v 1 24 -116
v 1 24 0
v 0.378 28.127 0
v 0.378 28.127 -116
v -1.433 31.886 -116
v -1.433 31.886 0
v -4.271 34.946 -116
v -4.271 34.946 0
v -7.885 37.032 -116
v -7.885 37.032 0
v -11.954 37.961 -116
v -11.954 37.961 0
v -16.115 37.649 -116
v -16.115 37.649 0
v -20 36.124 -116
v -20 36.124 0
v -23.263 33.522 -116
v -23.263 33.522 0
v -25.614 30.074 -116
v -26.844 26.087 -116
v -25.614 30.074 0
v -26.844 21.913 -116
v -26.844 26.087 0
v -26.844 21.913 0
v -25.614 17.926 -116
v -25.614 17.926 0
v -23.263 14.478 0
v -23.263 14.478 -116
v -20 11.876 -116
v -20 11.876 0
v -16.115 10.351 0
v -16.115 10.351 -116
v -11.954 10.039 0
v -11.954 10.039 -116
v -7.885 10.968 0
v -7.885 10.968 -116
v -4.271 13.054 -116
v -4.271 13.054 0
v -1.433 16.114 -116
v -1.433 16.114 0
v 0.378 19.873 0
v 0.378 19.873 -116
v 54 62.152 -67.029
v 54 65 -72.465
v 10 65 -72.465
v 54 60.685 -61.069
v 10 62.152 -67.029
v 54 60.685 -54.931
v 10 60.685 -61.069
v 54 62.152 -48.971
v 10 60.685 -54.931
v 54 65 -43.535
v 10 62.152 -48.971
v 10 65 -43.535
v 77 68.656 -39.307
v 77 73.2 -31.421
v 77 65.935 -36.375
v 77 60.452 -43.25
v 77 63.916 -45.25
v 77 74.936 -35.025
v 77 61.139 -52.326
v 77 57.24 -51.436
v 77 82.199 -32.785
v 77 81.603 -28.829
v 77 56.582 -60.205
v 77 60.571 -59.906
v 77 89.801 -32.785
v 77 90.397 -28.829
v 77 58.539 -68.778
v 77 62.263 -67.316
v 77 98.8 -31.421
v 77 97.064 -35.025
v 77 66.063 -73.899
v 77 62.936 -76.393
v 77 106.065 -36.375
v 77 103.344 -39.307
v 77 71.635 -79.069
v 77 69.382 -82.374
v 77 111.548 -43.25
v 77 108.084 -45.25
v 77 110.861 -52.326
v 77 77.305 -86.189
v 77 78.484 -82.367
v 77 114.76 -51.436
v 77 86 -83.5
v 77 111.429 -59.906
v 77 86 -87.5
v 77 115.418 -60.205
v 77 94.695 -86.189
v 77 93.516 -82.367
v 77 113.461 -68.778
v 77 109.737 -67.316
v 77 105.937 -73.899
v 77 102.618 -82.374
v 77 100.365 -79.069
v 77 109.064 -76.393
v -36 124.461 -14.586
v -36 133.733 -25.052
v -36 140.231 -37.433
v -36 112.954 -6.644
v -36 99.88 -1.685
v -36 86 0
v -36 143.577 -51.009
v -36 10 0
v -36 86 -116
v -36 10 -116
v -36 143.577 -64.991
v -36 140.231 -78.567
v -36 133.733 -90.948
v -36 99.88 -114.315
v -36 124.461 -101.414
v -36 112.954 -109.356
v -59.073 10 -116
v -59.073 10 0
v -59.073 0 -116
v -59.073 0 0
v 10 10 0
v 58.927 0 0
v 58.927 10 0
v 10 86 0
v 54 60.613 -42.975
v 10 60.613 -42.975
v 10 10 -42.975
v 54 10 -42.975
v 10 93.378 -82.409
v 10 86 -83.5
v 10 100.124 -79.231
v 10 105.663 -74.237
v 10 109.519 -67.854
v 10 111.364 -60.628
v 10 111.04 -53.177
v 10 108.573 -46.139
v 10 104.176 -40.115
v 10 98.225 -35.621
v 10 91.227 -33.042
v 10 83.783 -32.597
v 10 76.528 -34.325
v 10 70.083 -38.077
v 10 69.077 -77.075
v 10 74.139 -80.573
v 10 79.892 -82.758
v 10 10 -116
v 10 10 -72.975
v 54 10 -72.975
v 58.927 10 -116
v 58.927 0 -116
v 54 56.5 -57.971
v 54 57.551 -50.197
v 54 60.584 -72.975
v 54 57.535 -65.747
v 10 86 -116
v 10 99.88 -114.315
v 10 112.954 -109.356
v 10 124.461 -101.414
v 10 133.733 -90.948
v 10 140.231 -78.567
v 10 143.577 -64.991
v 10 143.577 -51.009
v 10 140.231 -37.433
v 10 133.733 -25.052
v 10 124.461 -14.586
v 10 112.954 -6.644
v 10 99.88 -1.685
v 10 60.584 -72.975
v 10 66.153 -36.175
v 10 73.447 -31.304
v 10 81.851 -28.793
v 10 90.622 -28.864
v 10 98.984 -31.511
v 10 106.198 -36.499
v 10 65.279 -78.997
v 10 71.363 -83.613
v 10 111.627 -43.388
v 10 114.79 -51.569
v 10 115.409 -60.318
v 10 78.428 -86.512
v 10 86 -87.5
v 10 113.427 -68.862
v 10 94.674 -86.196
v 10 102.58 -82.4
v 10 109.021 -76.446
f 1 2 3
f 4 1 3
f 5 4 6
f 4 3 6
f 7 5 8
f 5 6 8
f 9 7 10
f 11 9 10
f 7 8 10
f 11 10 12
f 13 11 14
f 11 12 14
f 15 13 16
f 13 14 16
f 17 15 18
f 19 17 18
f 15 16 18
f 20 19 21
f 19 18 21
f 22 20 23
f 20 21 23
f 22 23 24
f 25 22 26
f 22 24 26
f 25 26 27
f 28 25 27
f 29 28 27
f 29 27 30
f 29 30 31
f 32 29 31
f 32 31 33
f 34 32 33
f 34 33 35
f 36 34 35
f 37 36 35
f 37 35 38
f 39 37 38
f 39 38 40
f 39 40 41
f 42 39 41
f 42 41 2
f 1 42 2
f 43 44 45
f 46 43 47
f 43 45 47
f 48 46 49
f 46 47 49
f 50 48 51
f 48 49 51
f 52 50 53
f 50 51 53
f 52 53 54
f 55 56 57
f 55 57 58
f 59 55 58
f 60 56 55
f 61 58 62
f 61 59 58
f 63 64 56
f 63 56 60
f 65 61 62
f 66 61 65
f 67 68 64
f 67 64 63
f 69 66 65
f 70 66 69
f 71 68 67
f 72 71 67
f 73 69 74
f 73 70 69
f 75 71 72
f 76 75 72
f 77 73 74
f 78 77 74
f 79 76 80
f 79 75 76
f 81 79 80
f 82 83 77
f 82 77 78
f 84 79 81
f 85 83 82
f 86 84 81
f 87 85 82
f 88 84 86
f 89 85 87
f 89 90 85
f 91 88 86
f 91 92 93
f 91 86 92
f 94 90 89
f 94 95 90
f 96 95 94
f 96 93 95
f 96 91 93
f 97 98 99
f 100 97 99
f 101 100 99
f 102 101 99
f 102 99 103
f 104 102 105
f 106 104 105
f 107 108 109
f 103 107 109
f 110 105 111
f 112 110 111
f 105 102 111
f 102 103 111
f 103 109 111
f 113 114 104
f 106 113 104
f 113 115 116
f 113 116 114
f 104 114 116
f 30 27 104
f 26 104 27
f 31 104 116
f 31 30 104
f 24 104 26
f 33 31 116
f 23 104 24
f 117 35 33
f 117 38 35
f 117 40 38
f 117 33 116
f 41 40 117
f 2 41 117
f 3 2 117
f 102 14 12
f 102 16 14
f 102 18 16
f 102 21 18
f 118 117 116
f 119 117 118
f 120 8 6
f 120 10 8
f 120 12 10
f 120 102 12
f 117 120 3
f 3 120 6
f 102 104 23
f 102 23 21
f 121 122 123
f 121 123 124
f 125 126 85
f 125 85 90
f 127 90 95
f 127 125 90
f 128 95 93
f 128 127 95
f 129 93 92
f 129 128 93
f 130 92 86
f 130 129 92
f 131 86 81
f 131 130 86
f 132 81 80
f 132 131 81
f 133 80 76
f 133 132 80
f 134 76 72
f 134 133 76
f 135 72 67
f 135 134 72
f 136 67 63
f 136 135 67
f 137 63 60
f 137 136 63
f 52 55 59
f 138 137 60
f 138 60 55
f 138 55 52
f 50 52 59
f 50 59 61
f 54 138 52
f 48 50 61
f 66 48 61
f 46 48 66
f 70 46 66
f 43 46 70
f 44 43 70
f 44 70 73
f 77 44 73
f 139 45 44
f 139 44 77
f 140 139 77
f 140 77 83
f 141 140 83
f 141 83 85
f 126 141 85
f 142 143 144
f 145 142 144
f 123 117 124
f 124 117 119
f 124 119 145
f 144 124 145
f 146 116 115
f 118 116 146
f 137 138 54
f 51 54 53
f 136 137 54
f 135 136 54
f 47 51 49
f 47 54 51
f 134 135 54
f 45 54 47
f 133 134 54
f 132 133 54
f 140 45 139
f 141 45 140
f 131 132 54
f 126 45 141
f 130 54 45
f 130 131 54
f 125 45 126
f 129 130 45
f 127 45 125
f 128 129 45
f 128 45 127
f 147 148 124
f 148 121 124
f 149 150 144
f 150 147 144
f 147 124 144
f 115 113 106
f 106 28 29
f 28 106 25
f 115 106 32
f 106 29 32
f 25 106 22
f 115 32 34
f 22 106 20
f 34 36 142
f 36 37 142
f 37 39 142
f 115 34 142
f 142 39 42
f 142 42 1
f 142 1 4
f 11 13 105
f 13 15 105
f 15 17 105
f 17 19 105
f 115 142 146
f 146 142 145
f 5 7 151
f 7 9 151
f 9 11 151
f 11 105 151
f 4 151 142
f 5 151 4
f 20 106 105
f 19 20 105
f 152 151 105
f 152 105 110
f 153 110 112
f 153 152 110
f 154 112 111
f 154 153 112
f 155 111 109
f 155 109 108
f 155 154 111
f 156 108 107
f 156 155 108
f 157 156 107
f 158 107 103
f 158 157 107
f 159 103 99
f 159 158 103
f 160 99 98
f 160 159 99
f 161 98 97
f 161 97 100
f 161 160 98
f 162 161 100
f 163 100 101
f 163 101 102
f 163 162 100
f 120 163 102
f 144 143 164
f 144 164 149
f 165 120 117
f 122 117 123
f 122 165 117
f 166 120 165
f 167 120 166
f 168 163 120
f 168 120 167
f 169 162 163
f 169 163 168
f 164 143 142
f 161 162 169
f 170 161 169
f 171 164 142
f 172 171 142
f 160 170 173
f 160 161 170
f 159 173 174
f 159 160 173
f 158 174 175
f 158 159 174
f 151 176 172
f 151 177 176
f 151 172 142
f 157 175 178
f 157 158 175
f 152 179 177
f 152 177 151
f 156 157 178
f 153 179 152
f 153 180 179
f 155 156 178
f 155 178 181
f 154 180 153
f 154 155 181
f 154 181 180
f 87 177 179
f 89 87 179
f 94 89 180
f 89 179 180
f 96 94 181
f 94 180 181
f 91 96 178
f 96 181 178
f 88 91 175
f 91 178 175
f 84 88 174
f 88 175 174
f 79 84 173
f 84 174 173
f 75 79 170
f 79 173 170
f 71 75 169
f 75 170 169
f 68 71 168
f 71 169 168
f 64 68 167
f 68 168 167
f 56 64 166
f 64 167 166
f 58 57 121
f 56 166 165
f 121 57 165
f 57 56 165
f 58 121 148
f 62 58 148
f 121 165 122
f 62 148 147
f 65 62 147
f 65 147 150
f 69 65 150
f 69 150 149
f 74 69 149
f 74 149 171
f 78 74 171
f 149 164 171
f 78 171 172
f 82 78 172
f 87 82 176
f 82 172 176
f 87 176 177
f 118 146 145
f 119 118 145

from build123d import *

# Parameters (mm, degrees)
SKETCH1_W           = 118
SKETCH1_H           = 10
BOSS_EXTRUDE1_DEPTH = 116
BOSS_EXTRUDE2_DEPTH = 46
SKETCH3_R           = 14
CUT_EXTRUDE1_DEPTH  = 195.117634996
SKETCH4_R           = 29.5
SKETCH4_R_2         = 25.5
BOSS_EXTRUDE3_DEPTH = 67
SKETCH6_W           = 44
SKETCH6_H           = 30
BOSS_EXTRUDE4_DEPTH = 55
CUT_EXTRUDE2_START  = -44
CUT_EXTRUDE2_DEPTH  = 44


with BuildPart() as part:
    # Sketch1 → Boss-Extrude1 (new body)
    with BuildSketch(Plane.XY):
        with Locations((-0.073312219, 5)):
            Rectangle(SKETCH1_W, SKETCH1_H)
    extrude(amount=-BOSS_EXTRUDE1_DEPTH)

    # Sketch2 → Boss-Extrude2 (add)
    with BuildSketch(Plane(origin=(10, 0, 0), x_dir=(0, 0, -1), z_dir=(1, 0, 0))):
        with BuildLine():
            Line((0, 86), (0, 10))
            Line((0, 10), (116, 10))
            Line((116, 10), (116, 86))
            ThreePointArc((116, 86), (58, 144), (0, 86))
        make_face()
    extrude(amount=-BOSS_EXTRUDE2_DEPTH)

    # Sketch3 → Cut-Extrude1 (cut, through all)
    with BuildSketch(Plane.XY):
        with Locations((-13, 24)):
            Circle(SKETCH3_R)
    extrude(amount=-CUT_EXTRUDE1_DEPTH, mode=Mode.SUBTRACT)

    # Sketch4 → Boss-Extrude3 (add)
    with BuildSketch(Plane(origin=(10, 0, 0), x_dir=(0, 0, -1), z_dir=(1, 0, 0))):
        with Locations((58, 86)):
            Circle(SKETCH4_R)
        with Locations((58, 86)):
            Circle(SKETCH4_R_2, mode=Mode.SUBTRACT)
    extrude(amount=BOSS_EXTRUDE3_DEPTH)

    # Sketch6 → Boss-Extrude4 (add)
    with BuildSketch(Plane(origin=(0, 10, 0), x_dir=(1, 0, 0), z_dir=(0, 1, 0))):
        with Locations((32, 57.975103421)):
            Rectangle(SKETCH6_W, SKETCH6_H)
    extrude(amount=BOSS_EXTRUDE4_DEPTH)

    # Sketch7 → Cut-Extrude2 (cut)
    with BuildSketch(Plane(origin=(54, 0, 0), x_dir=(0, 0, -1), z_dir=(1, 0, 0)).offset(CUT_EXTRUDE2_START)):
        with BuildLine():
            Line((43.534523859, 65), (72.465476141, 65))
            ThreePointArc((72.465476141, 65), (58, 60.5), (43.534523859, 65))
        make_face()
    extrude(amount=CUT_EXTRUDE2_DEPTH, mode=Mode.SUBTRACT)


solid = part.part
